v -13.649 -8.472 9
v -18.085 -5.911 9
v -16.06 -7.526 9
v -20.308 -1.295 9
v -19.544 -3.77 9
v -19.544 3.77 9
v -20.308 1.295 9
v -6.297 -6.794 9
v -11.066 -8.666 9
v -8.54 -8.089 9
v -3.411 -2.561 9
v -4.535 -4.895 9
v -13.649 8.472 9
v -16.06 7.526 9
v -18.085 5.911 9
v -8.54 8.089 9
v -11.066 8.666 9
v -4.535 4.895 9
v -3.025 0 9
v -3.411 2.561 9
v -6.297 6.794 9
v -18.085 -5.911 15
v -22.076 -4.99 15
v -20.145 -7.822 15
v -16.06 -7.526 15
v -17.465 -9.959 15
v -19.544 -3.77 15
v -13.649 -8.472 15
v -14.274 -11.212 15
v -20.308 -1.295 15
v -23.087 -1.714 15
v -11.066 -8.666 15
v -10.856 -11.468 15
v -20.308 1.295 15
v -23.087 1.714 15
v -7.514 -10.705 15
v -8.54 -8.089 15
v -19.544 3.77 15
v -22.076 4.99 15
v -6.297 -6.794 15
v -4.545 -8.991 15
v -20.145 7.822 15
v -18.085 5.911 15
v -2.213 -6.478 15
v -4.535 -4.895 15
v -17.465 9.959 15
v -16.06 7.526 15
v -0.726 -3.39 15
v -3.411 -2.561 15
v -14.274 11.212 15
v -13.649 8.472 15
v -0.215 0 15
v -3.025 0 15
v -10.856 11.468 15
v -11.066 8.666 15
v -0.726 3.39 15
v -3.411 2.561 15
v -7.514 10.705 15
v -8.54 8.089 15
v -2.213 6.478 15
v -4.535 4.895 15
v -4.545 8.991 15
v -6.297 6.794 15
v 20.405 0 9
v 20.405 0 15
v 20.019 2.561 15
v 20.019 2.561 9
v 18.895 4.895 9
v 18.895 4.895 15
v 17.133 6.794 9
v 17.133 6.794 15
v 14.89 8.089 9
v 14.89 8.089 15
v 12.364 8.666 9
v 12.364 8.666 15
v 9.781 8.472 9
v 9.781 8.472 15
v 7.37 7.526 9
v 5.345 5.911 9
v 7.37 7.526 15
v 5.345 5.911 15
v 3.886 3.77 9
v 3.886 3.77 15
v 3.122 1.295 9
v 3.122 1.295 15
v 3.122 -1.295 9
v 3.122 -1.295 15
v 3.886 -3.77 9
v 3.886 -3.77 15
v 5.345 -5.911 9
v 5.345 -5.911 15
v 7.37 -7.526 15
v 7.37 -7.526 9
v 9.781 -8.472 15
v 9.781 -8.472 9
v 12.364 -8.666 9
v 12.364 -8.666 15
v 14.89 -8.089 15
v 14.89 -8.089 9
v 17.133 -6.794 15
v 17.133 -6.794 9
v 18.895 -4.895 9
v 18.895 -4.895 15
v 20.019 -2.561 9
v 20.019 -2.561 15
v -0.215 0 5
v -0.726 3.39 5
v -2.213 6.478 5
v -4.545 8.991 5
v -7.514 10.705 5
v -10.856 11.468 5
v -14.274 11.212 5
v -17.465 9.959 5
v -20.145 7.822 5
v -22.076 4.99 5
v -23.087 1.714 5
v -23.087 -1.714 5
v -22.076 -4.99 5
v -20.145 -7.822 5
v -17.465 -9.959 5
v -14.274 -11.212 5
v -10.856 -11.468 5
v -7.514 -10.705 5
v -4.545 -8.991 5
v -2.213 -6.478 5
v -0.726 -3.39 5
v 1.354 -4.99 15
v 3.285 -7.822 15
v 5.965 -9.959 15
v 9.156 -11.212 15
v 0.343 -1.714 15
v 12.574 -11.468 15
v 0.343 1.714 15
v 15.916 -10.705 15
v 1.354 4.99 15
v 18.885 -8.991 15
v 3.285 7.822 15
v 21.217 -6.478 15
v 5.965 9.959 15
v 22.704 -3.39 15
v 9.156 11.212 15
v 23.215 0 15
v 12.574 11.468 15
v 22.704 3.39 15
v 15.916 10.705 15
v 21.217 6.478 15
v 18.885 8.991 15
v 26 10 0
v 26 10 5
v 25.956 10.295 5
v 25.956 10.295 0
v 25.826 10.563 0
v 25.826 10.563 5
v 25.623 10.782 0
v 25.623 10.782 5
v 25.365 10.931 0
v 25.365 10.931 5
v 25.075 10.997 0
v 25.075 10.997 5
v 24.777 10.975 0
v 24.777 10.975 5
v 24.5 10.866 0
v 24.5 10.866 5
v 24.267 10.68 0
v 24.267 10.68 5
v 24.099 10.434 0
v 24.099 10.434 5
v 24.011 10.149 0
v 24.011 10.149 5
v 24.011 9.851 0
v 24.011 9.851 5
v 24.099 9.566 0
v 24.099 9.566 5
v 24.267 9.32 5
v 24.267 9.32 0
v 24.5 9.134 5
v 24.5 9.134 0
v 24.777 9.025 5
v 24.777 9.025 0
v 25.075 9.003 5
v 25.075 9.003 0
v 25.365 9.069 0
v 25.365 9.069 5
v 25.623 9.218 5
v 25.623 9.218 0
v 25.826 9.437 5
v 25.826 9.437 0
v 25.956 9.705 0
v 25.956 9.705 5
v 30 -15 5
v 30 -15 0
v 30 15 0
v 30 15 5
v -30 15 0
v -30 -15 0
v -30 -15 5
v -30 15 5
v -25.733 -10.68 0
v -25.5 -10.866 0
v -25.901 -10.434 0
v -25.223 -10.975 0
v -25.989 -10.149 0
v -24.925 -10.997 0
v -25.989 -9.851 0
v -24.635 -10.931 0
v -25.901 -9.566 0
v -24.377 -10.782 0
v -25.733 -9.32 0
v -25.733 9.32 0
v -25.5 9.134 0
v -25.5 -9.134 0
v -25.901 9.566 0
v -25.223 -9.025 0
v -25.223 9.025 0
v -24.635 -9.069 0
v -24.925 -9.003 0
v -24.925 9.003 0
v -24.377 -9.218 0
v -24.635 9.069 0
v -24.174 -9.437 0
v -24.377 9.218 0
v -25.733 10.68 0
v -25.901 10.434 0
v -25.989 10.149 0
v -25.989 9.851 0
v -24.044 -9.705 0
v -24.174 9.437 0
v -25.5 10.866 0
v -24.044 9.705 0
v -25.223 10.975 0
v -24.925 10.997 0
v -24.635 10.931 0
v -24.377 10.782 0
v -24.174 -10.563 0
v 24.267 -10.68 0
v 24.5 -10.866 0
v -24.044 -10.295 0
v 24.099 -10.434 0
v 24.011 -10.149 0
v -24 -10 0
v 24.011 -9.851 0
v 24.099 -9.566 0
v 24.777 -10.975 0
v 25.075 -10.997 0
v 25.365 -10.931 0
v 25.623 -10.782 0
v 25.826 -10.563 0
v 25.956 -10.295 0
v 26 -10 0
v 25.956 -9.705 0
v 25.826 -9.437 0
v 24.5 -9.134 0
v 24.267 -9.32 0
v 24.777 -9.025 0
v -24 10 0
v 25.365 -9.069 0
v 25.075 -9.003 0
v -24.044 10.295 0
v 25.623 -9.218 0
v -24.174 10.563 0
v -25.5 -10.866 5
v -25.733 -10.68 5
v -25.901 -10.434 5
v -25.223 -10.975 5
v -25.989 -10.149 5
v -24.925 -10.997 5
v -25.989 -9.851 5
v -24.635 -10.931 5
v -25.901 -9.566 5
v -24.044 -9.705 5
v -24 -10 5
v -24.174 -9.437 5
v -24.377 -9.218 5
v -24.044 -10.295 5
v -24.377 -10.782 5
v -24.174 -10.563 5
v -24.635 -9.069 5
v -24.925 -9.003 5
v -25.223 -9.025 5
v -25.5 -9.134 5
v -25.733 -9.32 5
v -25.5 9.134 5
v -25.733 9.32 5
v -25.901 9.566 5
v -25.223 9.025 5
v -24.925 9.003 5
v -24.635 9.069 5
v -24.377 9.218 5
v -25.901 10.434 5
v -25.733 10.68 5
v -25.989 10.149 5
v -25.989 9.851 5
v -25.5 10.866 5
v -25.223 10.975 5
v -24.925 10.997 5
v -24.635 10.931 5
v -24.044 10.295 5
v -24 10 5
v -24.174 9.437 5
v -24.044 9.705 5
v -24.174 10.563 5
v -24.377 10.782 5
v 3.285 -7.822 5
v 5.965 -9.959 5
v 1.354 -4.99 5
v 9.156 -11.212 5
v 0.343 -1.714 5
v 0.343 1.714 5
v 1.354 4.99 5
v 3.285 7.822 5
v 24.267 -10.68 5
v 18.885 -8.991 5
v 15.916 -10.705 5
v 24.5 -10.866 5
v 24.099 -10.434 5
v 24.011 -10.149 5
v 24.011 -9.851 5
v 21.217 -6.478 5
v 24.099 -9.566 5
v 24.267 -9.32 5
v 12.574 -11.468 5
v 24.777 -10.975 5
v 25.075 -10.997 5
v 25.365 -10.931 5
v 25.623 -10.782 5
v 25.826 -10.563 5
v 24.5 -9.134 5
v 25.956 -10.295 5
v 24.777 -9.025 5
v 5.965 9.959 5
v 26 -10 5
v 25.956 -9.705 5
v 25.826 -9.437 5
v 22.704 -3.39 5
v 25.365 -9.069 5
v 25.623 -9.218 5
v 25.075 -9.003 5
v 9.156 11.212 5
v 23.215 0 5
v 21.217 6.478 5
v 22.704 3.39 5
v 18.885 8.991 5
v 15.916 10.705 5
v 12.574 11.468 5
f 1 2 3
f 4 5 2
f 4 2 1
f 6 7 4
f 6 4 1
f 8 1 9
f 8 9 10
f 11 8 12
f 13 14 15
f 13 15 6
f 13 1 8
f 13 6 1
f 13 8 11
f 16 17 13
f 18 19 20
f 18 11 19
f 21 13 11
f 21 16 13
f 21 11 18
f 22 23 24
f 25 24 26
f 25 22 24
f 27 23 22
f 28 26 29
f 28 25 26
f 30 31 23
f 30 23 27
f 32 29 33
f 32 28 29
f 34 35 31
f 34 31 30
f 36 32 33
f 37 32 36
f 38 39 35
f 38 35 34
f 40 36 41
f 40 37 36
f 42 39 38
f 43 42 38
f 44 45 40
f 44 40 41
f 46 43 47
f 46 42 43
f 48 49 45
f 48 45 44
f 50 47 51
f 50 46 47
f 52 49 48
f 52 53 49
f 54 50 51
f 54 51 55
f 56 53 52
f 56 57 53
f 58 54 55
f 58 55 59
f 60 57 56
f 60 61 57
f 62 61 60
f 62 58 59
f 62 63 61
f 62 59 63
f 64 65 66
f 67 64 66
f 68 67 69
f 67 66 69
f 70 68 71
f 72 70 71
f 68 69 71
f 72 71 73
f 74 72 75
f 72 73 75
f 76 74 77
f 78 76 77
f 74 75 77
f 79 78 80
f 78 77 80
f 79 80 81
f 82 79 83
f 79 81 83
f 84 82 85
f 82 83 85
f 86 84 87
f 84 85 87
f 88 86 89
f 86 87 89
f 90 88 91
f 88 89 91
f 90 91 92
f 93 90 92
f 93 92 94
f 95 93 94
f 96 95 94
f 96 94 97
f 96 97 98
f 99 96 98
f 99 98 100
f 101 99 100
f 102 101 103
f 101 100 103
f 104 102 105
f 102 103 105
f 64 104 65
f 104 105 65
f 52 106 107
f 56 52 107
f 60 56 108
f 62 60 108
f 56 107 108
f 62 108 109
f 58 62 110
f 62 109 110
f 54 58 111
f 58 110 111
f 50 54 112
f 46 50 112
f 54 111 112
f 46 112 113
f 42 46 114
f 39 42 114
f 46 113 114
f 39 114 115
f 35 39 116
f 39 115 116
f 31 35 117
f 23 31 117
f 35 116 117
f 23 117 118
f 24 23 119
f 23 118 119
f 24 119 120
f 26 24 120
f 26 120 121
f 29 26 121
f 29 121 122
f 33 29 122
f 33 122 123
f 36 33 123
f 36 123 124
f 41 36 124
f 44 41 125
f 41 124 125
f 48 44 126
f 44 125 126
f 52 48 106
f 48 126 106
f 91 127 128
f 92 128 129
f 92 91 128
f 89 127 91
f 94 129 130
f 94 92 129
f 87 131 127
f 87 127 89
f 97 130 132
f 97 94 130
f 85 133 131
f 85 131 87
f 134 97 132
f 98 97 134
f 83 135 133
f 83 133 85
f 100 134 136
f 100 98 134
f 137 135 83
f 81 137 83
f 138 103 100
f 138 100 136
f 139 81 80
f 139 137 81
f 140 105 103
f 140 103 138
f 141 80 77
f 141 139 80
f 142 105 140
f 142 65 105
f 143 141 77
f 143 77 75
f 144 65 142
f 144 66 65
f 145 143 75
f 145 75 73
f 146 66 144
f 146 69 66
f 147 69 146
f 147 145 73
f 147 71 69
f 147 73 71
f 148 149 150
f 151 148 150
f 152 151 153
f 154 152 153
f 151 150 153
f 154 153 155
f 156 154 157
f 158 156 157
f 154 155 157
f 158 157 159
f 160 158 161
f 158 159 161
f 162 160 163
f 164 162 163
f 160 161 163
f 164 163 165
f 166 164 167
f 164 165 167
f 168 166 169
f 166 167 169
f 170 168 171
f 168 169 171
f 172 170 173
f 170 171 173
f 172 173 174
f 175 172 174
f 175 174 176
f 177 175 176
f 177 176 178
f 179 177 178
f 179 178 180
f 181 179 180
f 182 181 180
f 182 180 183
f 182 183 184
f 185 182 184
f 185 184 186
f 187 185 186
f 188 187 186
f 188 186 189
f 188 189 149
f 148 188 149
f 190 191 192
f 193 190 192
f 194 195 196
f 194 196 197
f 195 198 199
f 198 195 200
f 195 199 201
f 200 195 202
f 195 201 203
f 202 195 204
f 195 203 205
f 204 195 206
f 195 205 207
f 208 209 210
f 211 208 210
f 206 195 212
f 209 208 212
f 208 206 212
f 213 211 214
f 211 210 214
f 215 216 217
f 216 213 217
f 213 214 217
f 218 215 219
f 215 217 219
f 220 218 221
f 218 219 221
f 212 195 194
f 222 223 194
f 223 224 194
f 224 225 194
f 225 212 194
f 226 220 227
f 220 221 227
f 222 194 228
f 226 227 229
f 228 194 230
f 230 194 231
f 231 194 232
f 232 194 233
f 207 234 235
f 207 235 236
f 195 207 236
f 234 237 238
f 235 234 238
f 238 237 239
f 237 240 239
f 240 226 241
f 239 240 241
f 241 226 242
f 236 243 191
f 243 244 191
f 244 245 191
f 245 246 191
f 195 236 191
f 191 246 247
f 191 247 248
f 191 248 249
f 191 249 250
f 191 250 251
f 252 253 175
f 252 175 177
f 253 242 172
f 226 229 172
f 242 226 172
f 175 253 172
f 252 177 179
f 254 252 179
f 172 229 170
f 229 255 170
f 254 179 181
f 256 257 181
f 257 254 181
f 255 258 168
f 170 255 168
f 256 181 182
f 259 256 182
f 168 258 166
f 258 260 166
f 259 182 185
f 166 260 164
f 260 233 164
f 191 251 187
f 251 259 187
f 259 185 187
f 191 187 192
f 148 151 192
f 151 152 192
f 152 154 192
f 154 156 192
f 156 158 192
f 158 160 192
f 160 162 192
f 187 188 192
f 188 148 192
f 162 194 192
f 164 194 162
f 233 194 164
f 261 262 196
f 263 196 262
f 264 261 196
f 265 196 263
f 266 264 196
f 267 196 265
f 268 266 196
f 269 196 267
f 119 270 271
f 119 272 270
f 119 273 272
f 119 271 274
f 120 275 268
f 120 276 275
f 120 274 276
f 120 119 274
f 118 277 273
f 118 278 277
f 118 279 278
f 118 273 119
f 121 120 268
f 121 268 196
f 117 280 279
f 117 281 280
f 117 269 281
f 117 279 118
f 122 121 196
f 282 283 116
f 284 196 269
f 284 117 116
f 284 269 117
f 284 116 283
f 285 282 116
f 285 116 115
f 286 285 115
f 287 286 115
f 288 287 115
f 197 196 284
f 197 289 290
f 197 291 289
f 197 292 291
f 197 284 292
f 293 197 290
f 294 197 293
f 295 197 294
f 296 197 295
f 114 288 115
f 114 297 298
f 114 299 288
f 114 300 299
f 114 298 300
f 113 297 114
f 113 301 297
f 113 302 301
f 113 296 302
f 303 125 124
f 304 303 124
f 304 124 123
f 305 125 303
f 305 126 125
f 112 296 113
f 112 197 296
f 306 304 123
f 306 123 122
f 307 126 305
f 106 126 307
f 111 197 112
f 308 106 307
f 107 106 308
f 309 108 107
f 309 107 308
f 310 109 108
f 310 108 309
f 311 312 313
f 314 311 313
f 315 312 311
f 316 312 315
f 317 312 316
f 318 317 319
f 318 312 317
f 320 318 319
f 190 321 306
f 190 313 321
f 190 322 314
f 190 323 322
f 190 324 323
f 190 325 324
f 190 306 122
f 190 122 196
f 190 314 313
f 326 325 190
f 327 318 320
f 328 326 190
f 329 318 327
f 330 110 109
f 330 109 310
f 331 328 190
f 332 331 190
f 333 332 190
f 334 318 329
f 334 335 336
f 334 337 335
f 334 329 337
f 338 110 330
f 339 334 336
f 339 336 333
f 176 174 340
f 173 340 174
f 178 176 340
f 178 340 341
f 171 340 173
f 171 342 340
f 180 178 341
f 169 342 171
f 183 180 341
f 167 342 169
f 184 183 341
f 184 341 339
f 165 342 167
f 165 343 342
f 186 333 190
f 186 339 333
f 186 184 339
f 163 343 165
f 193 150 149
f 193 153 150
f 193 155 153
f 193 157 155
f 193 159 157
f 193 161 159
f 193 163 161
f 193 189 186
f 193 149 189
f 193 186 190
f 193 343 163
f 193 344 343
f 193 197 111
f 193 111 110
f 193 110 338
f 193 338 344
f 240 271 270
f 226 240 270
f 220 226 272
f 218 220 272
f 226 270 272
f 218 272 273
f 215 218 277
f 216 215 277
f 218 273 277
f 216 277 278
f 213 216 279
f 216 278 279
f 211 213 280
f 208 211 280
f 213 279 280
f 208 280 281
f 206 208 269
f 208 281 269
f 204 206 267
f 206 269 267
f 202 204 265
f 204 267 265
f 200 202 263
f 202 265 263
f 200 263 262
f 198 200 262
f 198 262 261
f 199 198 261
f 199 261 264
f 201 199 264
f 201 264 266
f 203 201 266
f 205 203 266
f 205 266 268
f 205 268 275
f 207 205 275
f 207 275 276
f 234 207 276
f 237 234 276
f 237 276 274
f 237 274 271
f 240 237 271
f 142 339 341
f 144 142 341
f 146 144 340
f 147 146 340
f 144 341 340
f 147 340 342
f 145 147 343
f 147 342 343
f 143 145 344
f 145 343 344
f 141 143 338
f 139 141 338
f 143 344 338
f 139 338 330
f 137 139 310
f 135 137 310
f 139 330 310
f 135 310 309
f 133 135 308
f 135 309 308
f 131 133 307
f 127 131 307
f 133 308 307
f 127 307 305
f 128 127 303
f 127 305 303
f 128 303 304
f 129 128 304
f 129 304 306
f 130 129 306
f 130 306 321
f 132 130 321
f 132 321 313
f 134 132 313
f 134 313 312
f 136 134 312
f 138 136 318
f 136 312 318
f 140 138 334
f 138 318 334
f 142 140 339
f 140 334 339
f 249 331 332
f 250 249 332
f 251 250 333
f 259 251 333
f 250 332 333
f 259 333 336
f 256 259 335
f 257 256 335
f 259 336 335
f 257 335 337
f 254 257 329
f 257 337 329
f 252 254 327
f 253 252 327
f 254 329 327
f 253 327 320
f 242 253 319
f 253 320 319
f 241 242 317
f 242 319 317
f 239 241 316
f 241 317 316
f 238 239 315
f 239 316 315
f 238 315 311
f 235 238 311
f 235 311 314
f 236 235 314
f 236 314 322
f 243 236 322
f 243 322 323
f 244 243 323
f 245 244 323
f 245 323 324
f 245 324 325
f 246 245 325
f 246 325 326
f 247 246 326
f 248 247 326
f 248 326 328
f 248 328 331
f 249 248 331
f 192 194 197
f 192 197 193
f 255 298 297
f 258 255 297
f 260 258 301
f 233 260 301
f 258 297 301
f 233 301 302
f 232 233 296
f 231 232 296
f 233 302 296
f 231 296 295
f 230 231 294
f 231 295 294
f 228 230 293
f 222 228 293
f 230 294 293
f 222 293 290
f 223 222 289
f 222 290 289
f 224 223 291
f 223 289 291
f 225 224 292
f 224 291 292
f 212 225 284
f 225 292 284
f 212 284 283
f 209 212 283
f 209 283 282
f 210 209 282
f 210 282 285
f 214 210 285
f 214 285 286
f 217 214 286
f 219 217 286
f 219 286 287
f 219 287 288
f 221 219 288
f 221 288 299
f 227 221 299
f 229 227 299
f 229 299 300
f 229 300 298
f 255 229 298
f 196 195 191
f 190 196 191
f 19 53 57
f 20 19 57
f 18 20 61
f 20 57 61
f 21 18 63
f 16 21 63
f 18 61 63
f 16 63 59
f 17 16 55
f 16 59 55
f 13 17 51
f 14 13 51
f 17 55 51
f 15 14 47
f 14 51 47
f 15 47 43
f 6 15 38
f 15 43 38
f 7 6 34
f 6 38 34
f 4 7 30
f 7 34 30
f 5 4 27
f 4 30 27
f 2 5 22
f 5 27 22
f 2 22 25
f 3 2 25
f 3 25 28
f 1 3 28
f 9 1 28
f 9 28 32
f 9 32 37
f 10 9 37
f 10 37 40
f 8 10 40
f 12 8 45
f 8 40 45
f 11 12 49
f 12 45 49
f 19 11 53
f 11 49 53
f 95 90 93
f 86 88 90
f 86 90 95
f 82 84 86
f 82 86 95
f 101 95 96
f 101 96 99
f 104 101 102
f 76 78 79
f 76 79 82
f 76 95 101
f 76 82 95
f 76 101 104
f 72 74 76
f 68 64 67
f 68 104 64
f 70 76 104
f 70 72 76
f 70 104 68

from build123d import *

# Parameters (mm, degrees)
SKETCH1_W           = 60
SKETCH1_H           = 30
BOSS_EXTRUDE2_DEPTH = 5
SKETCH2_R           = 11.5
BOSS_EXTRUDE3_DEPTH = 10
SKETCH3_R           = 8.69
CUT_EXTRUDE2_DEPTH  = 6
SKETCH4_R           = 1
CUT_EXTRUDE4_DEPTH  = 10


with BuildPart() as part:
    # Sketch1 → Boss-Extrude2 (new body)
    with BuildSketch(Plane.XY):
        Rectangle(SKETCH1_W, SKETCH1_H)
    extrude(amount=BOSS_EXTRUDE2_DEPTH)

    # Sketch2 → Boss-Extrude3 (add)
    with BuildSketch(Plane.XY.offset(5)):
        with Locations((-11.715, 0)):
            Circle(SKETCH2_R)
        with Locations((11.715, 0)):
            Circle(SKETCH2_R)
    extrude(amount=BOSS_EXTRUDE3_DEPTH)

    # Sketch3 → Cut-Extrude2 (cut)
    with BuildSketch(Plane.XY.offset(15)):
        with Locations((-11.715, 0)):
            Circle(SKETCH3_R)
        with Locations((11.715, 0)):
            Circle(SKETCH3_R)
    extrude(amount=-CUT_EXTRUDE2_DEPTH, mode=Mode.SUBTRACT)

    # Sketch4 → Cut-Extrude4 (cut)
    with BuildSketch(Plane.XY.offset(5)):
        with Locations((-25, 10)):
            Circle(SKETCH4_R)
        with Locations((25, 10)):
            Circle(SKETCH4_R)
        with Locations((25, -10)):
            Circle(SKETCH4_R)
        with Locations((-25, -10)):
            Circle(SKETCH4_R)
    extrude(amount=-CUT_EXTRUDE4_DEPTH, mode=Mode.SUBTRACT)


solid = part.part
